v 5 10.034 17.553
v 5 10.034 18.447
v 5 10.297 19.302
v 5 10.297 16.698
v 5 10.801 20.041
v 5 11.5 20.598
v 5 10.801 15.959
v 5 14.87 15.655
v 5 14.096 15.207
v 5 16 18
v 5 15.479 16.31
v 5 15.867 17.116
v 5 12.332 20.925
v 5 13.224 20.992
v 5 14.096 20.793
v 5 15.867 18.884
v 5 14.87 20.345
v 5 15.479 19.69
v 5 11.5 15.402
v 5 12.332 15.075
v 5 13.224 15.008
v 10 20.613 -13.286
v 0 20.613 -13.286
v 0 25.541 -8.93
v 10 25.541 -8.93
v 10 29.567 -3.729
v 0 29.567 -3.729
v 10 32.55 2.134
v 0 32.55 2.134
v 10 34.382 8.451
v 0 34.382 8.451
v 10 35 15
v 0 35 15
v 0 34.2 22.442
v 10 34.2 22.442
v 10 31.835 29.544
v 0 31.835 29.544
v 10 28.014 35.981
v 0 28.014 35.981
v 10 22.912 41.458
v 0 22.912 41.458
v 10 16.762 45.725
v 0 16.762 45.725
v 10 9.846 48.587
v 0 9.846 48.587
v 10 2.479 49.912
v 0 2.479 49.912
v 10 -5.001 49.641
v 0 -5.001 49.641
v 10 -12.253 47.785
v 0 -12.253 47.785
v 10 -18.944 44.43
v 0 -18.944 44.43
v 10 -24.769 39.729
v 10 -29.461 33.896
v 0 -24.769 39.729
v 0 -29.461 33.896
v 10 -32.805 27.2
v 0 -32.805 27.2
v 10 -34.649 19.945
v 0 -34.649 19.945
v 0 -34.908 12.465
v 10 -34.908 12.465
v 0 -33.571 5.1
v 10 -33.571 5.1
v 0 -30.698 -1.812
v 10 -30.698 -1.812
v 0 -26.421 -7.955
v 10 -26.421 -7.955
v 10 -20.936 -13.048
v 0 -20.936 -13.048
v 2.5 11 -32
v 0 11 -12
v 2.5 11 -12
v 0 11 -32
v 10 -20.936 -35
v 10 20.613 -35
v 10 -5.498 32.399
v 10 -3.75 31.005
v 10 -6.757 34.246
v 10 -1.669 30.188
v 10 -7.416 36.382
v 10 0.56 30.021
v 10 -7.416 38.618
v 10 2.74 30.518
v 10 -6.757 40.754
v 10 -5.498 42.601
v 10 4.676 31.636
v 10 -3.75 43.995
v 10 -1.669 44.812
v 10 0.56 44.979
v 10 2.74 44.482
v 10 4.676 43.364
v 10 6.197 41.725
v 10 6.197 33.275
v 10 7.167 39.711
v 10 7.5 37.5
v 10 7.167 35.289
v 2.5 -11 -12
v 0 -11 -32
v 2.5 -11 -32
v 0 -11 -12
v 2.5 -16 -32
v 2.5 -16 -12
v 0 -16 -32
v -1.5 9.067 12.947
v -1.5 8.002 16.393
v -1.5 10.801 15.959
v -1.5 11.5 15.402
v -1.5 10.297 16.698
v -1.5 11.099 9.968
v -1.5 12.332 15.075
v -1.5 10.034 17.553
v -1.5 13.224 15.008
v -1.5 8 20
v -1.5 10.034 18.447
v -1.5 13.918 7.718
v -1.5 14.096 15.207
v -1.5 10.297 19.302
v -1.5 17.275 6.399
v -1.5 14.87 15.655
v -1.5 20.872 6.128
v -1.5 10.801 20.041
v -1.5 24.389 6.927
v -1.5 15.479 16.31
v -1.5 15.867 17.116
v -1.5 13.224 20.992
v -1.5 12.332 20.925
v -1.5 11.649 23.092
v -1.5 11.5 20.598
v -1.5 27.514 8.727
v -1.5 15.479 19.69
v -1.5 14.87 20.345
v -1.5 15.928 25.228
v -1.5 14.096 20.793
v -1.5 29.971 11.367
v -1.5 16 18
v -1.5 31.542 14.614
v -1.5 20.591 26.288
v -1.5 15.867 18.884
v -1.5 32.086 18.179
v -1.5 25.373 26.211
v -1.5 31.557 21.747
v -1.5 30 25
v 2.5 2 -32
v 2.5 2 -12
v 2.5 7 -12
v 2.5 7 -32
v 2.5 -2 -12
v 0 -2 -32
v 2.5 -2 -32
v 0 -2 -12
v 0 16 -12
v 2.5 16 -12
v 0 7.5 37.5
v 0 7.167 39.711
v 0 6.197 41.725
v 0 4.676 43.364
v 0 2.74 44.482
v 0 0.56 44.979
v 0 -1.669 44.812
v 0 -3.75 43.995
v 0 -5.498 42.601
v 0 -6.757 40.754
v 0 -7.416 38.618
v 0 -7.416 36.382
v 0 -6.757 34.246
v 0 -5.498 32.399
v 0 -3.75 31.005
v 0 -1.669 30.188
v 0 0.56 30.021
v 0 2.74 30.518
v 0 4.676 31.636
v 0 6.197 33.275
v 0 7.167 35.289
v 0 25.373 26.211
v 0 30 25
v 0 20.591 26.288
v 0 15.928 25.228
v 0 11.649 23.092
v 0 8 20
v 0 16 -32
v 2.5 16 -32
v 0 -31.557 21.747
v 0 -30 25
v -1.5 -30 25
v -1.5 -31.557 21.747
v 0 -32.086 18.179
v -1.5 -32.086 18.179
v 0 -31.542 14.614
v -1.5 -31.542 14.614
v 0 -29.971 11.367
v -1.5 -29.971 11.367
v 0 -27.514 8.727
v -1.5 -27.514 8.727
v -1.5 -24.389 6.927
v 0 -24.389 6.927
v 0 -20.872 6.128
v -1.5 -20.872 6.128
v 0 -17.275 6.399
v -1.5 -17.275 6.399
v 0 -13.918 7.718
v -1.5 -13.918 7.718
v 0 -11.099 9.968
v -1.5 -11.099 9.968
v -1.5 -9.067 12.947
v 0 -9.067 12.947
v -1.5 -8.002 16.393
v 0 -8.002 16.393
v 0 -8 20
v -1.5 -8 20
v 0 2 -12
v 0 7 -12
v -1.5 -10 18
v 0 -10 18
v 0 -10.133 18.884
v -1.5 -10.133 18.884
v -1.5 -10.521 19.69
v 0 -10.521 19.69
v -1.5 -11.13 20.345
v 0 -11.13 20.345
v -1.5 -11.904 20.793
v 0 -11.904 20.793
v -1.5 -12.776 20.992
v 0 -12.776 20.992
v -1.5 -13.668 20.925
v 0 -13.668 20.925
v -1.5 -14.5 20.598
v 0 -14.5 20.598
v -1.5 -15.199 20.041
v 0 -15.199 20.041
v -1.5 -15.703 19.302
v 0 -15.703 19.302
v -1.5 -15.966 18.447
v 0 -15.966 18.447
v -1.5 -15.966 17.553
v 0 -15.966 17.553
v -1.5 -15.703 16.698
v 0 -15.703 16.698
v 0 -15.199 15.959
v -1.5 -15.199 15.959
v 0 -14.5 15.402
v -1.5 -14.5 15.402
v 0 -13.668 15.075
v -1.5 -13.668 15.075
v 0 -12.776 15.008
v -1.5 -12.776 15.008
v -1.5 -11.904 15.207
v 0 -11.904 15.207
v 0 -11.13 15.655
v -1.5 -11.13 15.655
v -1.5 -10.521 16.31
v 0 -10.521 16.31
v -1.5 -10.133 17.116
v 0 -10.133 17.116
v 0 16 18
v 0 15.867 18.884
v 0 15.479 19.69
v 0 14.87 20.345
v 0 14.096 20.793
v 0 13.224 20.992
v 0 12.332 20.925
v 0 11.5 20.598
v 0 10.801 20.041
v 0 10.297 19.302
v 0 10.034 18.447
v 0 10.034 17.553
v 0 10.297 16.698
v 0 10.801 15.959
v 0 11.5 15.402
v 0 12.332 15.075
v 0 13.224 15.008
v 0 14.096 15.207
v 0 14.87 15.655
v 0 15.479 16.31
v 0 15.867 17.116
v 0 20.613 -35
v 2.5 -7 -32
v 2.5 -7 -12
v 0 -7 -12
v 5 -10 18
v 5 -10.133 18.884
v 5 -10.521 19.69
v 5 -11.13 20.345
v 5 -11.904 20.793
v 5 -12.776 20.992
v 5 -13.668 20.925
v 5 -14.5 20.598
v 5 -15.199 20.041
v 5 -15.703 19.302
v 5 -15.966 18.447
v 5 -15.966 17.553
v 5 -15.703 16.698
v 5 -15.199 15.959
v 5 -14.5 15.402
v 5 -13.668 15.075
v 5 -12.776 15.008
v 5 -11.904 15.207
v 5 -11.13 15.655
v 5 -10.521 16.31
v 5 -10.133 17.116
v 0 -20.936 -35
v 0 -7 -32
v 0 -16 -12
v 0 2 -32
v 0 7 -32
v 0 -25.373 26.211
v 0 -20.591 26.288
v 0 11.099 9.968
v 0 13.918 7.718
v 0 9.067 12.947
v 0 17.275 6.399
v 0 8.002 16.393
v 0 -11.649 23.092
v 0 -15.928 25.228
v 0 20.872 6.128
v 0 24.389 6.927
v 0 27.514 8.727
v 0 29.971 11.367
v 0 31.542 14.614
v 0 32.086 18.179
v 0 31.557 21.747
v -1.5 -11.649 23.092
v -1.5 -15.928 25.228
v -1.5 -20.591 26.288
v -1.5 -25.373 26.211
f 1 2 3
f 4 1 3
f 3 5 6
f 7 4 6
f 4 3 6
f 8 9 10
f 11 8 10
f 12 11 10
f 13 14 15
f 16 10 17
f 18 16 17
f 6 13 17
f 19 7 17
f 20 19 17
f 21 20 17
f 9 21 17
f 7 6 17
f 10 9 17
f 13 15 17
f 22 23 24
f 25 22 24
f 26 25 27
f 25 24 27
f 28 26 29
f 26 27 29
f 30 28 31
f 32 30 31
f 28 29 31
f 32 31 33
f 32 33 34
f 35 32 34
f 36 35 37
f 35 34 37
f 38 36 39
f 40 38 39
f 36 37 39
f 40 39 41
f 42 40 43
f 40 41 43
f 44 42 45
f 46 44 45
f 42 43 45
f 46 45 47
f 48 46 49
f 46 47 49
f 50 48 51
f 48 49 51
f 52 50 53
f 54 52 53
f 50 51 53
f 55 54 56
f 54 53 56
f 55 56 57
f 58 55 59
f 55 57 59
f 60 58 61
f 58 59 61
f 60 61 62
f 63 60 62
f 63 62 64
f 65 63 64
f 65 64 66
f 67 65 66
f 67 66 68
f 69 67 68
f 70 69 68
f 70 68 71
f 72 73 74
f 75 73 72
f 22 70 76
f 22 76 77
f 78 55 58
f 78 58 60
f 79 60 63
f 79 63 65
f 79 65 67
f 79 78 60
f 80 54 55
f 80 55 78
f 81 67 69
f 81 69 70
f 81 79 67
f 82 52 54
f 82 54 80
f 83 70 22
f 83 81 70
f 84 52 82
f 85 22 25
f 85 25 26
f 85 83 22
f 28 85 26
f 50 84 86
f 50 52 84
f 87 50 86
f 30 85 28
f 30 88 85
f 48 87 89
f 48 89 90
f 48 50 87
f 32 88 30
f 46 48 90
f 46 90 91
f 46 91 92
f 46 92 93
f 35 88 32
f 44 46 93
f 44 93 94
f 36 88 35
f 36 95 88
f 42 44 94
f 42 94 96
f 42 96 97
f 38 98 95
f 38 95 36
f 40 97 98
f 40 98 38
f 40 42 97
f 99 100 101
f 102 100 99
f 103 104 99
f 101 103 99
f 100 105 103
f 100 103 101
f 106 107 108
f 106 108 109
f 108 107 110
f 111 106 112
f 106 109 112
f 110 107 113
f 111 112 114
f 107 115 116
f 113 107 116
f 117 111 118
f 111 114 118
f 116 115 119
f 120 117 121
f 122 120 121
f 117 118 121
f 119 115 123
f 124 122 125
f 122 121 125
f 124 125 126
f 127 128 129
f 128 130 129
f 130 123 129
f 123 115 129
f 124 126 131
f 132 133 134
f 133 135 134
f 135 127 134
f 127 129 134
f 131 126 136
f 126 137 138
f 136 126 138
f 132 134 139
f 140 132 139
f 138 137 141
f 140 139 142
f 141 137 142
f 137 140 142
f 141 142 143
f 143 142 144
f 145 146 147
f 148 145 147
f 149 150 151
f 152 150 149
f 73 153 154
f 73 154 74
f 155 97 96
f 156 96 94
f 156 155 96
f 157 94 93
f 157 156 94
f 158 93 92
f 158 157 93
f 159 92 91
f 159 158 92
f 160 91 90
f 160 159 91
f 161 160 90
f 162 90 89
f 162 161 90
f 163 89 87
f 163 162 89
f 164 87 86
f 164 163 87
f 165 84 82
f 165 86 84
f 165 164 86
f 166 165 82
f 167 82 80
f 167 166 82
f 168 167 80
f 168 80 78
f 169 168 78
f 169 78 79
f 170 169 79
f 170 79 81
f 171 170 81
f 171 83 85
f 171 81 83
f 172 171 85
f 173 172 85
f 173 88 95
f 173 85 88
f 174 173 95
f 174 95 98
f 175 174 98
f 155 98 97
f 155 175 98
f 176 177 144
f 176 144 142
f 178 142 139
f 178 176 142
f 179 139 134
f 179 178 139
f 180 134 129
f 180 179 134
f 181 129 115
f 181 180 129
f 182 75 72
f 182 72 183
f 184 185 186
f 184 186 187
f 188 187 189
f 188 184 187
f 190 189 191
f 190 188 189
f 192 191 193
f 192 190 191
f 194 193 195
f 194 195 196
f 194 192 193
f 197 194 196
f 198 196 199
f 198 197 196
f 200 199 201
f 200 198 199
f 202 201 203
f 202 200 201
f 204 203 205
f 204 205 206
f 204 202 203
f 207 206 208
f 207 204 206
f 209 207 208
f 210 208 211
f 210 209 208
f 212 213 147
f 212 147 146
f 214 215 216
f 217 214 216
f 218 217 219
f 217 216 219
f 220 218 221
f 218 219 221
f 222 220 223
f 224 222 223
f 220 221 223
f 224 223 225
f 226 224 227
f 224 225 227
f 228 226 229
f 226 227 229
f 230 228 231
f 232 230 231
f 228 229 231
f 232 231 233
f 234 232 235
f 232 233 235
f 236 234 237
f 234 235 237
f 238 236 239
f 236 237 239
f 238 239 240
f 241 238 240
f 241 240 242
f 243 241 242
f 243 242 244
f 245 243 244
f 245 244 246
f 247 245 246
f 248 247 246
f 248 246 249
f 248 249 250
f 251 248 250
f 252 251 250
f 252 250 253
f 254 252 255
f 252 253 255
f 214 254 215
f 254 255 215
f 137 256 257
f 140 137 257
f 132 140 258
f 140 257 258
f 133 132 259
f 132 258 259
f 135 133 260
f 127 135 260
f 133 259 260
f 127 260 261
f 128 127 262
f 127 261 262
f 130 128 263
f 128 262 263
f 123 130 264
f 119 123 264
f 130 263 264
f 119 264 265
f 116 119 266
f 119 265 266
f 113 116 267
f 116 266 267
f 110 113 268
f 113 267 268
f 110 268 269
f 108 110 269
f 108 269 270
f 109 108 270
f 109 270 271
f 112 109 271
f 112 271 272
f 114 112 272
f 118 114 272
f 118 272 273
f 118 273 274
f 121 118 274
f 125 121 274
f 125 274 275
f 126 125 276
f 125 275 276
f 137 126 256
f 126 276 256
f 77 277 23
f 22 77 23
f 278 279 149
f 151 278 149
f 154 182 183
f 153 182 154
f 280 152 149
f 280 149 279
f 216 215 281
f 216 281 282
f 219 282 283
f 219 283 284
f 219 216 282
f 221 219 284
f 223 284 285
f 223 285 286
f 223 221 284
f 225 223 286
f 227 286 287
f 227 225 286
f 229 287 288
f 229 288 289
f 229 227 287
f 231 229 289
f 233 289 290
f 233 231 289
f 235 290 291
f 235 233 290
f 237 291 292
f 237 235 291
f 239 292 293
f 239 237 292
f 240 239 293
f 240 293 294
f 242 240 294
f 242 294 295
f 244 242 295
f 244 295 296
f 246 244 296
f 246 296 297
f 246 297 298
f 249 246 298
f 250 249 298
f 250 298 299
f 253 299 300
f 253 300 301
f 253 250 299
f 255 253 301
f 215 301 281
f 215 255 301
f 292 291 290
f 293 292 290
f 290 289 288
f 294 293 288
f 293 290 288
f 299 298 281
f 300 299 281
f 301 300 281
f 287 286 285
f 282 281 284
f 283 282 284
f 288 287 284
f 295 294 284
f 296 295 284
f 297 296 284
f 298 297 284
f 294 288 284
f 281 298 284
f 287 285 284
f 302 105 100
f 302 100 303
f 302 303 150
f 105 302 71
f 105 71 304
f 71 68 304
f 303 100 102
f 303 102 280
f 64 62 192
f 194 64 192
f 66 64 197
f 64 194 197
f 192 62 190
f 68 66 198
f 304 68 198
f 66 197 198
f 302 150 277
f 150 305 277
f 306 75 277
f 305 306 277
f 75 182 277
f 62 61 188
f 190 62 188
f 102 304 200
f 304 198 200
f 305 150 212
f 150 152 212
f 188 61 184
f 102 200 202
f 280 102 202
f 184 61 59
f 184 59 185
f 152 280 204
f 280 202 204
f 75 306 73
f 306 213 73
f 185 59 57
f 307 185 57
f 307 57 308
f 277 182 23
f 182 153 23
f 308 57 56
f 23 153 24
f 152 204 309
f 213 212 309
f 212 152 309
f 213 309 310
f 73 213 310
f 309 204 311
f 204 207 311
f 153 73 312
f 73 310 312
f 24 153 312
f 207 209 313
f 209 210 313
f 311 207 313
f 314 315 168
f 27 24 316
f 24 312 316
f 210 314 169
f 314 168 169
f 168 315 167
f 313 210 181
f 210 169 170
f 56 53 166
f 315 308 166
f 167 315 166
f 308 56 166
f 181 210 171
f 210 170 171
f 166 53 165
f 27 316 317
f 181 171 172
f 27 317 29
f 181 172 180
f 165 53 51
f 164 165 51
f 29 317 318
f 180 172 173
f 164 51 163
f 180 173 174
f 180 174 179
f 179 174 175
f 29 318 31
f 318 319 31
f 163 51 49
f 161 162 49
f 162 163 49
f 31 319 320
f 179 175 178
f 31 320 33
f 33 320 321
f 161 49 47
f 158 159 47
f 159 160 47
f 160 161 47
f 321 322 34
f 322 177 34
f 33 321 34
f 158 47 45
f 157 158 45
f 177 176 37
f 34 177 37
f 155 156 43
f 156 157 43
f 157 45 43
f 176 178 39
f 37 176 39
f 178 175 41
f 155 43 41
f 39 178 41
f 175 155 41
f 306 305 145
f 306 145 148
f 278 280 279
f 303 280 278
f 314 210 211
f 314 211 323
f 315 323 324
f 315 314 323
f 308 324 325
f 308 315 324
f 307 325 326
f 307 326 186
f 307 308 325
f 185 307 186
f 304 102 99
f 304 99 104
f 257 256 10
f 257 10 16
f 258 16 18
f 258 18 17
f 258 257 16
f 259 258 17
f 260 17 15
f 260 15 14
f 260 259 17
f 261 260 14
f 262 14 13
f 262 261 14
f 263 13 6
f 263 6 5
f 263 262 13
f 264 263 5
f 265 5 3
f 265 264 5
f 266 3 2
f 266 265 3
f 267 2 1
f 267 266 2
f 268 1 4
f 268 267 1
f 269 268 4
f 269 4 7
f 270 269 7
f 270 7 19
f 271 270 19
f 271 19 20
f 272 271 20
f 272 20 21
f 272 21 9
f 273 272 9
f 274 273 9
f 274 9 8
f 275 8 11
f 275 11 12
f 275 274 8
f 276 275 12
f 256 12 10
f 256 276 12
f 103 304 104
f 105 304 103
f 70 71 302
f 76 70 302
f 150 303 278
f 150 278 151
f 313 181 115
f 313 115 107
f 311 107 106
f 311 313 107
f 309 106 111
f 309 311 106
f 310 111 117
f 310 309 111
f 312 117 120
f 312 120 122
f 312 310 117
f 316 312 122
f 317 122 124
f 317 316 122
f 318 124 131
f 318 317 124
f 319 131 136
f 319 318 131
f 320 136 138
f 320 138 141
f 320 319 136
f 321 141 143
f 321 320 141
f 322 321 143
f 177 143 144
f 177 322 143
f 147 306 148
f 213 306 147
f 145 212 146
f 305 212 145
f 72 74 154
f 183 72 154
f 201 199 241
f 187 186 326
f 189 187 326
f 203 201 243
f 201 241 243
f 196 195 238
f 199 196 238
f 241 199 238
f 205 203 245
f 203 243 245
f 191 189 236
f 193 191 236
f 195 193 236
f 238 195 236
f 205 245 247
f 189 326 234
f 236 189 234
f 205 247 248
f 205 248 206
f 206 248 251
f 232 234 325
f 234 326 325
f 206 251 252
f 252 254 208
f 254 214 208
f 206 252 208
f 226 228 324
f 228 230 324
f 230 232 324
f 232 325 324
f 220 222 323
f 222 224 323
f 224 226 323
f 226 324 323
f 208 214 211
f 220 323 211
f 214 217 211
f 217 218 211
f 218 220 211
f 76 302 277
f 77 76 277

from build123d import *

# Parameters (mm, degrees)
F0_R     = 3
F1_DEPTH = 10
F2_DEPTH = 1.5
F3_DEPTH = 5
F5_DEPTH = 2.5
F6_R     = 7.5
F7_DEPTH = 39.2


with BuildPart() as f1:
    # F0 (on Right) → F1 (new body)
    with BuildSketch(Plane.YZ):
        with BuildLine():
            ThreePointArc((20.61274, -13.2863032171), (31.1965214407, -0.8674840476), (35, 15))
            ThreePointArc((35, 15), (-15.6884798499, 46.2869237861), (-20.93552, -13.0482441933))
            Line((-20.93552, -13.0482441933), (-20.93552, -5))
            Line((-20.93552, -5), (20.61274, -5))
            Line((20.61274, -5), (20.61274, -13.2863032171))
        make_face()
        with BuildLine():
            ThreePointArc((-30, 25), (-18.2276824926, 25.8981970324), (-8, 20))
            ThreePointArc((-8, 20), (-22.6601045644, 6.3955399166), (-30, 25))
        make_face(mode=Mode.SUBTRACT)
        with BuildLine():
            ThreePointArc((8, 20), (18.2276824926, 25.8981970324), (30, 25))
            ThreePointArc((30, 25), (22.6601045644, 6.3955399166), (8, 20))
        make_face(mode=Mode.SUBTRACT)
        with BuildLine():
            ThreePointArc((20.61274, -13.2863032171), (-0.2005361733, -19.9994254988), (-20.93552, -13.0482441933))
            Line((-20.93552, -13.0482441933), (-20.93552, -35))
            Line((-20.93552, -35), (20.61274, -35))
            Line((20.61274, -35), (20.61274, -13.2863032171))
        make_face()
        with BuildLine():
            Line((-20.93552, -5), (-20.93552, -13.0482441933))
            ThreePointArc((-20.93552, -13.0482441933), (-0.2005361733, -19.9994254988), (20.61274, -13.2863032171))
            Line((20.61274, -13.2863032171), (20.61274, -5))
            Line((20.61274, -5), (-20.93552, -5))
        make_face()
        with BuildLine():
            ThreePointArc((-30, 25), (-22.6601045644, 6.3955399166), (-8, 20))
            ThreePointArc((-8, 20), (-18.2276824926, 25.8981970324), (-30, 25))
        make_face()
        with Locations((-13, 18)):
            Circle(F0_R, mode=Mode.SUBTRACT)
        with BuildLine():
            ThreePointArc((8, 20), (22.6601045644, 6.3955399166), (30, 25))
            ThreePointArc((30, 25), (18.2276824926, 25.8981970324), (8, 20))
        make_face()
        with Locations((13, 18)):
            Circle(F0_R, mode=Mode.SUBTRACT)
        with Locations((-13, 18)):
            Circle(F0_R)
        with Locations((13, 18)):
            Circle(F0_R)
    extrude(amount=F1_DEPTH)

    # F0 (on Right) → F2 (join)
    with BuildSketch(Plane.YZ):
        with BuildLine():
            ThreePointArc((-30, 25), (-22.6601045644, 6.3955399166), (-8, 20))
            ThreePointArc((-8, 20), (-18.2276824926, 25.8981970324), (-30, 25))
        make_face()
        with Locations((-13, 18)):
            Circle(F0_R, mode=Mode.SUBTRACT)
        with BuildLine():
            ThreePointArc((8, 20), (22.6601045644, 6.3955399166), (30, 25))
            ThreePointArc((30, 25), (18.2276824926, 25.8981970324), (8, 20))
        make_face()
        with Locations((13, 18)):
            Circle(F0_R, mode=Mode.SUBTRACT)
    extrude(amount=-F2_DEPTH)

    # F0 (on Right) → F3 (cut)
    with BuildSketch(Plane.YZ):
        with Locations((-13, 18)):
            Circle(F0_R)
        with Locations((13, 18)):
            Circle(F0_R)
    extrude(amount=F3_DEPTH, mode=Mode.SUBTRACT)

    # F4 (on face) → F5 (cut)
    with BuildSketch(Plane.YZ):
        with BuildLine():
            Line((-11, -12), (-16, -12))
            Line((-16, -12), (-16, -16.1287648325))
            ThreePointArc((-16, -16.1287648325), (-13.5406838246, -17.2746011836), (-11, -18.2264954517))
            Line((-11, -18.2264954517), (-11, -12))
        make_face()
        with BuildLine():
            Line((-7, -12), (-7, -19.292856399))
            ThreePointArc((-7, -19.292856399), (-4.5117191909, -19.7079874084), (-2, -19.9428104193))
            Line((-2, -19.9428104193), (-2, -12))
            Line((-2, -12), (-7, -12))
        make_face()
        with BuildLine():
            Line((2, -12), (2, -19.9428104193))
            ThreePointArc((2, -19.9428104193), (4.5117191909, -19.7079874084), (7, -19.292856399))
            Line((7, -19.292856399), (7, -12))
            Line((7, -12), (2, -12))
        make_face()
        with BuildLine():
            ThreePointArc((11, -18.2264954517), (13.5406838246, -17.2746011836), (16, -16.1287648325))
            Line((16, -16.1287648325), (16, -12))
            Line((16, -12), (11, -12))
            Line((11, -12), (11, -18.2264954517))
        make_face()
        with BuildLine():
            Line((16, -32), (16, -16.1287648325))
            ThreePointArc((16, -16.1287648325), (13.5406838246, -17.2746011836), (11, -18.2264954517))
            Line((11, -18.2264954517), (11, -32))
            Line((11, -32), (16, -32))
        make_face()
        with BuildLine():
            ThreePointArc((-11, -18.2264954517), (-13.5406838246, -17.2746011836), (-16, -16.1287648325))
            Line((-16, -16.1287648325), (-16, -32))
            Line((-16, -32), (-11, -32))
            Line((-11, -32), (-11, -18.2264954517))
        make_face()
        with BuildLine():
            ThreePointArc((7, -19.292856399), (4.5117191909, -19.7079874084), (2, -19.9428104193))
            Line((2, -19.9428104193), (2, -32))
            Line((2, -32), (7, -32))
            Line((7, -32), (7, -19.292856399))
        make_face()
        with BuildLine():
            ThreePointArc((-2, -19.9428104193), (-4.5117191909, -19.7079874084), (-7, -19.292856399))
            Line((-7, -19.292856399), (-7, -32))
            Line((-7, -32), (-2, -32))
            Line((-2, -32), (-2, -19.9428104193))
        make_face()
    extrude(amount=F5_DEPTH, mode=Mode.SUBTRACT)

    # F6 (on face) → F7 (cut)
    with BuildSketch(Plane.YZ):
        with Locations((0, 37.5)):
            Circle(F6_R)
    extrude(amount=F7_DEPTH, mode=Mode.SUBTRACT)


solid = f1.part
